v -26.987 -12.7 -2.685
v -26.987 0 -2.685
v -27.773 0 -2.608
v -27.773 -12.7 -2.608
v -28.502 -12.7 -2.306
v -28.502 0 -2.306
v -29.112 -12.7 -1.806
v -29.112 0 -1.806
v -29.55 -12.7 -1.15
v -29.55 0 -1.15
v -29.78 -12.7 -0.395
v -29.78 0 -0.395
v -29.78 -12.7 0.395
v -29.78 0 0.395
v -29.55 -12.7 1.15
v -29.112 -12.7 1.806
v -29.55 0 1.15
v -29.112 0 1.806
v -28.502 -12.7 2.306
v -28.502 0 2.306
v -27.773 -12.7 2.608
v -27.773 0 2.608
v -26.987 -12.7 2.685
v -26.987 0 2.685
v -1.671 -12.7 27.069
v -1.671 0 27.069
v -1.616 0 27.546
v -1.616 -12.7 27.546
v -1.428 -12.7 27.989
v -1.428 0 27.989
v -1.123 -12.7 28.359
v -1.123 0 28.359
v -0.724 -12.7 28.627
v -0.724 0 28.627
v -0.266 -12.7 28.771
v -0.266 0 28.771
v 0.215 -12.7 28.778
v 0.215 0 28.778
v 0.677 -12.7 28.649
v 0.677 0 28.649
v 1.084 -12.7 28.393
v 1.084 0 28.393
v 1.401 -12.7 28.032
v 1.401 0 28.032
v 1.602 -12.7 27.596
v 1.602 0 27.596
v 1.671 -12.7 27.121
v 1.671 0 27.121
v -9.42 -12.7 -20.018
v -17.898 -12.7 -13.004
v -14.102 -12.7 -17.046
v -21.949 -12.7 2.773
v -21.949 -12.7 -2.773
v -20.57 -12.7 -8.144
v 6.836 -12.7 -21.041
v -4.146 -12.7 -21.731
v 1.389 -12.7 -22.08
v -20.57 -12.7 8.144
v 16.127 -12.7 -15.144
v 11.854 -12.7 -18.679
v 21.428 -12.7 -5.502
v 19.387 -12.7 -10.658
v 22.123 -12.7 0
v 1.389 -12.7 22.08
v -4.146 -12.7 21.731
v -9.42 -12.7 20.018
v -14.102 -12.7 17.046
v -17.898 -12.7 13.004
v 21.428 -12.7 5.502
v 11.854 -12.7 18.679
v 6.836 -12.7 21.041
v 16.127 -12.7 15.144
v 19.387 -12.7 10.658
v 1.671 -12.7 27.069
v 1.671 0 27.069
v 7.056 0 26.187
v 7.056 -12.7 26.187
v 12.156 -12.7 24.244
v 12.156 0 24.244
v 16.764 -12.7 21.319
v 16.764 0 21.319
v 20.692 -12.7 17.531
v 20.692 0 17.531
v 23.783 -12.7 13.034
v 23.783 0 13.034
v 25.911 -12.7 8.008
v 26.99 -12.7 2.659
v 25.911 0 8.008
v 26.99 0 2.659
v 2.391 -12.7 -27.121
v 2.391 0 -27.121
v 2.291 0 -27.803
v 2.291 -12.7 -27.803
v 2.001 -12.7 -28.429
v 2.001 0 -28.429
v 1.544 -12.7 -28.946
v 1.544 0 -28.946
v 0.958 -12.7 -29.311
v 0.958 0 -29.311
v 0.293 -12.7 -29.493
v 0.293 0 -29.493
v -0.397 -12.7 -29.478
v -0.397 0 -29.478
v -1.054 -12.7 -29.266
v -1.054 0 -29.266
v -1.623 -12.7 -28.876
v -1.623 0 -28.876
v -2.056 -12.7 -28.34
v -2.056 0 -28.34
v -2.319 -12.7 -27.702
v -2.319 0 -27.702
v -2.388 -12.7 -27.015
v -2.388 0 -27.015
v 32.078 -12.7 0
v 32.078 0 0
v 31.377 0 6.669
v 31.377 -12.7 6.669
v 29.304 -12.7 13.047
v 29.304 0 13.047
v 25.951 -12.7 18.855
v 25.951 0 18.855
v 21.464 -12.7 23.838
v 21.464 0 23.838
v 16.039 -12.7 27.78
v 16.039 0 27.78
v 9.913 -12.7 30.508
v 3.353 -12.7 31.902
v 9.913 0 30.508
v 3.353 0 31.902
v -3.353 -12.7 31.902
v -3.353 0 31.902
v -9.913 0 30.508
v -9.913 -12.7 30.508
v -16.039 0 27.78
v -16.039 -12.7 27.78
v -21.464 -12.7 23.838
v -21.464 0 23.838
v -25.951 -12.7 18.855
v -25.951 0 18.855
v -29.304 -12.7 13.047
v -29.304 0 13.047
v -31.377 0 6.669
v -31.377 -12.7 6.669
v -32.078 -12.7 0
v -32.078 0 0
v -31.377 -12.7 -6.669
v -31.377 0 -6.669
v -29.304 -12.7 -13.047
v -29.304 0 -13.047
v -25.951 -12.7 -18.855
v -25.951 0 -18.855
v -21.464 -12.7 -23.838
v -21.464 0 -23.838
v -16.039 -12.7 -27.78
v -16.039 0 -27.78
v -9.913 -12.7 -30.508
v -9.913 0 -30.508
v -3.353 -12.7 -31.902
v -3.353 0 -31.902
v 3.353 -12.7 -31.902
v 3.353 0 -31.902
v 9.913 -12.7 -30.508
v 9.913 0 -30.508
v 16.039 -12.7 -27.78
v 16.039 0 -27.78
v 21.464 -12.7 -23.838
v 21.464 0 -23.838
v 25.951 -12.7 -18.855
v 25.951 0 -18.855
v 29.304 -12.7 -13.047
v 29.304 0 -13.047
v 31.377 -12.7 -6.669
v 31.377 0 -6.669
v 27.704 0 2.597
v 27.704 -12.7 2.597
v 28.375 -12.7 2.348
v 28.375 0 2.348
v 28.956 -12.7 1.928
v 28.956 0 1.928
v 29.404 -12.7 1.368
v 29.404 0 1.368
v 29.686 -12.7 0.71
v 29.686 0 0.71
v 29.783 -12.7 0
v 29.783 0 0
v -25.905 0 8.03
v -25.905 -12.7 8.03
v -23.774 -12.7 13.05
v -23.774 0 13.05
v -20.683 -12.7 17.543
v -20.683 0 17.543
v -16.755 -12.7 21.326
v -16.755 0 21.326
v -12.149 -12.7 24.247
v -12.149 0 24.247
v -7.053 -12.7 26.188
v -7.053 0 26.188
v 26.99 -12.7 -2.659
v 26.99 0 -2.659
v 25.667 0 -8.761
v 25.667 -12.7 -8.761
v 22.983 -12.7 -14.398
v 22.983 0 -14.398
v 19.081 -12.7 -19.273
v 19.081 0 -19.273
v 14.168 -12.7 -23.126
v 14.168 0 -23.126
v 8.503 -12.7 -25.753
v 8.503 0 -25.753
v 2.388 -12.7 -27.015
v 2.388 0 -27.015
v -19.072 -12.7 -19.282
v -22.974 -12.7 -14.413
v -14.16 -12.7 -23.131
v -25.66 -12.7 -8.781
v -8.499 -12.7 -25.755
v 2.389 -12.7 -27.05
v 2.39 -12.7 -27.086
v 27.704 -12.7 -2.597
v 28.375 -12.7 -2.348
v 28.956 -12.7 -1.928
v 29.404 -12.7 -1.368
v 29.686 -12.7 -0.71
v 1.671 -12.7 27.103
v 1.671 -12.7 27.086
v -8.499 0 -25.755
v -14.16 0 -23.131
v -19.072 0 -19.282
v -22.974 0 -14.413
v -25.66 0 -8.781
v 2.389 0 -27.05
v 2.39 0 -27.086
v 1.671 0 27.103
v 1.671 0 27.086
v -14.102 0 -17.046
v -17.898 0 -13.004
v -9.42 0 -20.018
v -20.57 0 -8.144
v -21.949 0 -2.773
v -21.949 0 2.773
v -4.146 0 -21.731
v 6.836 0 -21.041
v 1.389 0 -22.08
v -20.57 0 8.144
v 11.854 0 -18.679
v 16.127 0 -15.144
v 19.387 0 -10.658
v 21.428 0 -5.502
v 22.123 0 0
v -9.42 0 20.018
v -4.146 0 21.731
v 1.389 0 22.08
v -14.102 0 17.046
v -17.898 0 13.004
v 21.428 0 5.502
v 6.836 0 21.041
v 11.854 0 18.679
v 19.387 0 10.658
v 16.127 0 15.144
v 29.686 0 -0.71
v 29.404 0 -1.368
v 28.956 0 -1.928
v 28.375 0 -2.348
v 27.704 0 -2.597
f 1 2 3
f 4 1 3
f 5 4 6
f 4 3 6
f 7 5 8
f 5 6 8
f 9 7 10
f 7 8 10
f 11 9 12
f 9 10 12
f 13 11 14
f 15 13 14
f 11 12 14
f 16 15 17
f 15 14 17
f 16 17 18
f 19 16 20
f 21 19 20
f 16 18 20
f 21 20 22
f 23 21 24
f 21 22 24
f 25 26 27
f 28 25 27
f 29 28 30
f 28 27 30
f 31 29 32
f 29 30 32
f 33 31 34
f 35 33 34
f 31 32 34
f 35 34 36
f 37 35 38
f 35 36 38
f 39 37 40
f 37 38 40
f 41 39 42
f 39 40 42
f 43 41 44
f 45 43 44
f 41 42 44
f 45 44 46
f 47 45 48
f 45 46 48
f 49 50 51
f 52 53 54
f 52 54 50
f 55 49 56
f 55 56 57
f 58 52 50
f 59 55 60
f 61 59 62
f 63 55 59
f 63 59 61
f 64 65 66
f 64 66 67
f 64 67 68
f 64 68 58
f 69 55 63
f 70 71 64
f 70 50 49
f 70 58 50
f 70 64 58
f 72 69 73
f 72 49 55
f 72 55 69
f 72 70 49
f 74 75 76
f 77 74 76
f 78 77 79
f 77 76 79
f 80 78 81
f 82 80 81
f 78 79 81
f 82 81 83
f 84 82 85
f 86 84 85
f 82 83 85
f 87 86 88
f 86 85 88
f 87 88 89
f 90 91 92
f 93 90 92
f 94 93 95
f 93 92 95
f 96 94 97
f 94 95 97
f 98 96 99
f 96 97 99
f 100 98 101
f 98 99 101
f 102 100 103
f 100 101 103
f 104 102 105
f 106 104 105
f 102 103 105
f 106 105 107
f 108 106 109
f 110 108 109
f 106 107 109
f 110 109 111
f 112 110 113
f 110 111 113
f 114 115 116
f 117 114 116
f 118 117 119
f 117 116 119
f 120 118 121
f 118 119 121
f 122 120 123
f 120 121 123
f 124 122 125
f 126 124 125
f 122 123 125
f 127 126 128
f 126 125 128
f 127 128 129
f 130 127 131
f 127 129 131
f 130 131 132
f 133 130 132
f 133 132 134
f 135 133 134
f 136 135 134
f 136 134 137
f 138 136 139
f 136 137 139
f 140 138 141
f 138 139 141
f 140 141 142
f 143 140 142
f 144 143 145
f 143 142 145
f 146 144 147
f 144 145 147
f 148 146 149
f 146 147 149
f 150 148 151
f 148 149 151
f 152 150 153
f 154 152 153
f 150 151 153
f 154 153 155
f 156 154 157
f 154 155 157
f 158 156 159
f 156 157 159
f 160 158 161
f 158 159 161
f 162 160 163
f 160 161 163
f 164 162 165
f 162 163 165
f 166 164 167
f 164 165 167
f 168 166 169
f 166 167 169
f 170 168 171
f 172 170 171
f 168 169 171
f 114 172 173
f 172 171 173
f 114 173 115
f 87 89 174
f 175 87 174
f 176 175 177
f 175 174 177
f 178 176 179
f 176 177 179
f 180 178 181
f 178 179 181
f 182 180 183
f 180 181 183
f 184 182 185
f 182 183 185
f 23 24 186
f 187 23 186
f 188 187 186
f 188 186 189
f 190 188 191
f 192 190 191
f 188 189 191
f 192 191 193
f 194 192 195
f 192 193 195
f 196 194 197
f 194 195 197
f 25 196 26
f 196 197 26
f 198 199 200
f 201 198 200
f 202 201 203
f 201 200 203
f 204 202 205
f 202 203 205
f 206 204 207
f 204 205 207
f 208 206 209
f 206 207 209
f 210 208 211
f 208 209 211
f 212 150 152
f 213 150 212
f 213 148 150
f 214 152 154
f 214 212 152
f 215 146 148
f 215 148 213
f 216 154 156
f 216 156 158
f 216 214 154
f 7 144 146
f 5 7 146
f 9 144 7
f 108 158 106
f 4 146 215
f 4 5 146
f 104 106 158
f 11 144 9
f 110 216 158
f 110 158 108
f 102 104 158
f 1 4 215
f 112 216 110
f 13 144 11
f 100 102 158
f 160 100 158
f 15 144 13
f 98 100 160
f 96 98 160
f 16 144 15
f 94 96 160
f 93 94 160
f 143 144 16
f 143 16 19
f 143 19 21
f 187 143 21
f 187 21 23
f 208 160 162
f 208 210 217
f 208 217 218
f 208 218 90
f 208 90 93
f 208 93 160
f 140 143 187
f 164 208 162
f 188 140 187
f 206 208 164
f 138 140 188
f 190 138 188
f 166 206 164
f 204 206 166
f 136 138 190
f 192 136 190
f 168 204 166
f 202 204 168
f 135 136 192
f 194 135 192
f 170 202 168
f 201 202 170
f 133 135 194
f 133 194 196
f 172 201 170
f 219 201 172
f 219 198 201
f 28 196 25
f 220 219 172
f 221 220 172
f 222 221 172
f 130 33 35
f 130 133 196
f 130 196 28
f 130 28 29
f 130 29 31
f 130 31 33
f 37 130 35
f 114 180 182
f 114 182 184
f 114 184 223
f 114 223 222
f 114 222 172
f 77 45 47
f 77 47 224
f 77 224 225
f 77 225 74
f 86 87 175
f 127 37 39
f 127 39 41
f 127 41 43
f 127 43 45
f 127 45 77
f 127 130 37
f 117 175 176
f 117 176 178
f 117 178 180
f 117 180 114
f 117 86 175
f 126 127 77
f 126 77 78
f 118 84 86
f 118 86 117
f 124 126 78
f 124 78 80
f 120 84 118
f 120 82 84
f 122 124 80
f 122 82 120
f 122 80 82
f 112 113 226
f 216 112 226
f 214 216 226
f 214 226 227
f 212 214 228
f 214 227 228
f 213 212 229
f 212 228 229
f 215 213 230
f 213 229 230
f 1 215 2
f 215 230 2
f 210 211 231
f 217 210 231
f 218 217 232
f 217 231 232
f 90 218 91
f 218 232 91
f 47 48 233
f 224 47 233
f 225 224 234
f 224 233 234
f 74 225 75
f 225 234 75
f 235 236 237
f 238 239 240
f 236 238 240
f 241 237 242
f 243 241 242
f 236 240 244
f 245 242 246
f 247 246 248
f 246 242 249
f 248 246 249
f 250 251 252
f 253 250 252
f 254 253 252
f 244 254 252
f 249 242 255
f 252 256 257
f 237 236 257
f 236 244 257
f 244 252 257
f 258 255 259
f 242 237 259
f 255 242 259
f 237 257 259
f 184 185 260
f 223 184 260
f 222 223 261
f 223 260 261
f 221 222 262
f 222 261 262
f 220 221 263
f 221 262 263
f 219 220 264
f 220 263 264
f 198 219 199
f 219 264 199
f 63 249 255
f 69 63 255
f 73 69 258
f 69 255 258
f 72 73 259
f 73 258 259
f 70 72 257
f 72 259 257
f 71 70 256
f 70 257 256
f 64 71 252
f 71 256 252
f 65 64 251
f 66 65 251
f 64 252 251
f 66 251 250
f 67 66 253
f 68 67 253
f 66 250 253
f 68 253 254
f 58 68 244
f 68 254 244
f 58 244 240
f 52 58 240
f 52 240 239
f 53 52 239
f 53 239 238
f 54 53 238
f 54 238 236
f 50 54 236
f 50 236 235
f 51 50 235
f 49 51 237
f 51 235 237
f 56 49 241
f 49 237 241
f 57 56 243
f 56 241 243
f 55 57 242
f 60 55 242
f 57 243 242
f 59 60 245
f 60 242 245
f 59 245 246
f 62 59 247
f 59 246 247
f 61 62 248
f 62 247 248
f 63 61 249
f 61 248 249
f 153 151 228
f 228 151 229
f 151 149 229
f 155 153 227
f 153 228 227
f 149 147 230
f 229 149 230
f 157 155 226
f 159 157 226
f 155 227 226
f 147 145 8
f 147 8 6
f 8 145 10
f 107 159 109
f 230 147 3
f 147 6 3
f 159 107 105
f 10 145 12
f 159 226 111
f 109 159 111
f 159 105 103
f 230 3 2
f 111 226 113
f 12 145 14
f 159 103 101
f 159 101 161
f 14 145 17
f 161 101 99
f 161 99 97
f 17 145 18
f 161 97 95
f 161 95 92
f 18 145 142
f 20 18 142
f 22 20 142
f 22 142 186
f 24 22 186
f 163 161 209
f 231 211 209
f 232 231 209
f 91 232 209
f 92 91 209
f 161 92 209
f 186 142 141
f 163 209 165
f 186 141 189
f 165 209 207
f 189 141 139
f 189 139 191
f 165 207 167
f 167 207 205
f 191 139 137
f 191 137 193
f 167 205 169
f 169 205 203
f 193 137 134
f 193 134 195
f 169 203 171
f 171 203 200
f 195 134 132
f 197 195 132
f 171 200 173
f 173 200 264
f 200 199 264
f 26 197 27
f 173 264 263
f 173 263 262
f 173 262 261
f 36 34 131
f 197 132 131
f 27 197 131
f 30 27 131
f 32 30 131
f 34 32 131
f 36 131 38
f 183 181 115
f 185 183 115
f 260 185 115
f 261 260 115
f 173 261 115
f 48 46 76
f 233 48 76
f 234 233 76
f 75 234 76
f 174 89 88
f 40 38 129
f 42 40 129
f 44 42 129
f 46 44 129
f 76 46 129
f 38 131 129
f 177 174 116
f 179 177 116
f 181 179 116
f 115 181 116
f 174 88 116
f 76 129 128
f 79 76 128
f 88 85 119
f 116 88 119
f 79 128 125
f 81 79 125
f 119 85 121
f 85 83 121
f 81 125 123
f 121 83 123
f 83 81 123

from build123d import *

# Parameters (mm, degrees)
F0_R     = 32.0777446032
F1_DEPTH = 12.7
F0_R_2   = 22.1233486921


# Not quite as in the source:
# - a feature of the source that left no trace in its solid (it failed there, or was rolled back) is left out
# - a feature names something its author has since deleted; it is built from what else it names


with BuildPart() as f1:
    # F0 (on Front) → F1 (new body)
    with BuildSketch(Plane.XZ):
        Circle(F0_R)
        with BuildLine():
            ThreePointArc((1.6706113004, 27.0691254094), (18.8235281215, 19.5244278176), (26.9899975467, 2.658669775))
            ThreePointArc((26.9899975467, 2.658669775), (28.9560938487, 1.9278632057), (29.7825055927, 0))
            ThreePointArc((29.7825055927, 0), (28.9560938487, -1.9278632057), (26.9899975467, -2.658669775))
            ThreePointArc((26.9899975467, -2.658669775), (19.0808918692, -19.2729877814), (2.3881836562, -27.0152747787))
            ThreePointArc((2.3881836562, -27.0152747787), (2.3899256032, -27.0679388604), (2.3905063462, -27.1206285426))
            ThreePointArc((2.3905063462, -27.1206285426), (-0.0526896822, -29.5105541458), (-2.3881836562, -27.0152747787))
            ThreePointArc((-2.3881836562, -27.0152747787), (-19.0715734338, -19.2822088804), (-26.9874146305, -2.684761462))
            ThreePointArc((-26.9874146305, -2.684761462), (-29.8086929121, 0), (-26.9874146305, 2.684761462))
            ThreePointArc((-26.9874146305, 2.684761462), (-18.8140881746, 19.5335244824), (-1.6706113004, 27.0691254094))
            ThreePointArc((-1.6706113004, 27.0691254094), (-0.0257546243, 28.7918351095), (1.6714050047, 27.1206285426))
            ThreePointArc((1.6714050047, 27.1206285426), (1.6712065668, 27.0948739183), (1.6706113004, 27.0691254094))
        make_face(mode=Mode.SUBTRACT)
    extrude(amount=F1_DEPTH)


with BuildPart() as f1b:
    # F0 (on Front) → F1, piece 2 (new body)
    with BuildSketch(Plane.XZ):
        Circle(F0_R_2)
    extrude(amount=F1_DEPTH)


solid = Compound([f1.part, f1b.part])
